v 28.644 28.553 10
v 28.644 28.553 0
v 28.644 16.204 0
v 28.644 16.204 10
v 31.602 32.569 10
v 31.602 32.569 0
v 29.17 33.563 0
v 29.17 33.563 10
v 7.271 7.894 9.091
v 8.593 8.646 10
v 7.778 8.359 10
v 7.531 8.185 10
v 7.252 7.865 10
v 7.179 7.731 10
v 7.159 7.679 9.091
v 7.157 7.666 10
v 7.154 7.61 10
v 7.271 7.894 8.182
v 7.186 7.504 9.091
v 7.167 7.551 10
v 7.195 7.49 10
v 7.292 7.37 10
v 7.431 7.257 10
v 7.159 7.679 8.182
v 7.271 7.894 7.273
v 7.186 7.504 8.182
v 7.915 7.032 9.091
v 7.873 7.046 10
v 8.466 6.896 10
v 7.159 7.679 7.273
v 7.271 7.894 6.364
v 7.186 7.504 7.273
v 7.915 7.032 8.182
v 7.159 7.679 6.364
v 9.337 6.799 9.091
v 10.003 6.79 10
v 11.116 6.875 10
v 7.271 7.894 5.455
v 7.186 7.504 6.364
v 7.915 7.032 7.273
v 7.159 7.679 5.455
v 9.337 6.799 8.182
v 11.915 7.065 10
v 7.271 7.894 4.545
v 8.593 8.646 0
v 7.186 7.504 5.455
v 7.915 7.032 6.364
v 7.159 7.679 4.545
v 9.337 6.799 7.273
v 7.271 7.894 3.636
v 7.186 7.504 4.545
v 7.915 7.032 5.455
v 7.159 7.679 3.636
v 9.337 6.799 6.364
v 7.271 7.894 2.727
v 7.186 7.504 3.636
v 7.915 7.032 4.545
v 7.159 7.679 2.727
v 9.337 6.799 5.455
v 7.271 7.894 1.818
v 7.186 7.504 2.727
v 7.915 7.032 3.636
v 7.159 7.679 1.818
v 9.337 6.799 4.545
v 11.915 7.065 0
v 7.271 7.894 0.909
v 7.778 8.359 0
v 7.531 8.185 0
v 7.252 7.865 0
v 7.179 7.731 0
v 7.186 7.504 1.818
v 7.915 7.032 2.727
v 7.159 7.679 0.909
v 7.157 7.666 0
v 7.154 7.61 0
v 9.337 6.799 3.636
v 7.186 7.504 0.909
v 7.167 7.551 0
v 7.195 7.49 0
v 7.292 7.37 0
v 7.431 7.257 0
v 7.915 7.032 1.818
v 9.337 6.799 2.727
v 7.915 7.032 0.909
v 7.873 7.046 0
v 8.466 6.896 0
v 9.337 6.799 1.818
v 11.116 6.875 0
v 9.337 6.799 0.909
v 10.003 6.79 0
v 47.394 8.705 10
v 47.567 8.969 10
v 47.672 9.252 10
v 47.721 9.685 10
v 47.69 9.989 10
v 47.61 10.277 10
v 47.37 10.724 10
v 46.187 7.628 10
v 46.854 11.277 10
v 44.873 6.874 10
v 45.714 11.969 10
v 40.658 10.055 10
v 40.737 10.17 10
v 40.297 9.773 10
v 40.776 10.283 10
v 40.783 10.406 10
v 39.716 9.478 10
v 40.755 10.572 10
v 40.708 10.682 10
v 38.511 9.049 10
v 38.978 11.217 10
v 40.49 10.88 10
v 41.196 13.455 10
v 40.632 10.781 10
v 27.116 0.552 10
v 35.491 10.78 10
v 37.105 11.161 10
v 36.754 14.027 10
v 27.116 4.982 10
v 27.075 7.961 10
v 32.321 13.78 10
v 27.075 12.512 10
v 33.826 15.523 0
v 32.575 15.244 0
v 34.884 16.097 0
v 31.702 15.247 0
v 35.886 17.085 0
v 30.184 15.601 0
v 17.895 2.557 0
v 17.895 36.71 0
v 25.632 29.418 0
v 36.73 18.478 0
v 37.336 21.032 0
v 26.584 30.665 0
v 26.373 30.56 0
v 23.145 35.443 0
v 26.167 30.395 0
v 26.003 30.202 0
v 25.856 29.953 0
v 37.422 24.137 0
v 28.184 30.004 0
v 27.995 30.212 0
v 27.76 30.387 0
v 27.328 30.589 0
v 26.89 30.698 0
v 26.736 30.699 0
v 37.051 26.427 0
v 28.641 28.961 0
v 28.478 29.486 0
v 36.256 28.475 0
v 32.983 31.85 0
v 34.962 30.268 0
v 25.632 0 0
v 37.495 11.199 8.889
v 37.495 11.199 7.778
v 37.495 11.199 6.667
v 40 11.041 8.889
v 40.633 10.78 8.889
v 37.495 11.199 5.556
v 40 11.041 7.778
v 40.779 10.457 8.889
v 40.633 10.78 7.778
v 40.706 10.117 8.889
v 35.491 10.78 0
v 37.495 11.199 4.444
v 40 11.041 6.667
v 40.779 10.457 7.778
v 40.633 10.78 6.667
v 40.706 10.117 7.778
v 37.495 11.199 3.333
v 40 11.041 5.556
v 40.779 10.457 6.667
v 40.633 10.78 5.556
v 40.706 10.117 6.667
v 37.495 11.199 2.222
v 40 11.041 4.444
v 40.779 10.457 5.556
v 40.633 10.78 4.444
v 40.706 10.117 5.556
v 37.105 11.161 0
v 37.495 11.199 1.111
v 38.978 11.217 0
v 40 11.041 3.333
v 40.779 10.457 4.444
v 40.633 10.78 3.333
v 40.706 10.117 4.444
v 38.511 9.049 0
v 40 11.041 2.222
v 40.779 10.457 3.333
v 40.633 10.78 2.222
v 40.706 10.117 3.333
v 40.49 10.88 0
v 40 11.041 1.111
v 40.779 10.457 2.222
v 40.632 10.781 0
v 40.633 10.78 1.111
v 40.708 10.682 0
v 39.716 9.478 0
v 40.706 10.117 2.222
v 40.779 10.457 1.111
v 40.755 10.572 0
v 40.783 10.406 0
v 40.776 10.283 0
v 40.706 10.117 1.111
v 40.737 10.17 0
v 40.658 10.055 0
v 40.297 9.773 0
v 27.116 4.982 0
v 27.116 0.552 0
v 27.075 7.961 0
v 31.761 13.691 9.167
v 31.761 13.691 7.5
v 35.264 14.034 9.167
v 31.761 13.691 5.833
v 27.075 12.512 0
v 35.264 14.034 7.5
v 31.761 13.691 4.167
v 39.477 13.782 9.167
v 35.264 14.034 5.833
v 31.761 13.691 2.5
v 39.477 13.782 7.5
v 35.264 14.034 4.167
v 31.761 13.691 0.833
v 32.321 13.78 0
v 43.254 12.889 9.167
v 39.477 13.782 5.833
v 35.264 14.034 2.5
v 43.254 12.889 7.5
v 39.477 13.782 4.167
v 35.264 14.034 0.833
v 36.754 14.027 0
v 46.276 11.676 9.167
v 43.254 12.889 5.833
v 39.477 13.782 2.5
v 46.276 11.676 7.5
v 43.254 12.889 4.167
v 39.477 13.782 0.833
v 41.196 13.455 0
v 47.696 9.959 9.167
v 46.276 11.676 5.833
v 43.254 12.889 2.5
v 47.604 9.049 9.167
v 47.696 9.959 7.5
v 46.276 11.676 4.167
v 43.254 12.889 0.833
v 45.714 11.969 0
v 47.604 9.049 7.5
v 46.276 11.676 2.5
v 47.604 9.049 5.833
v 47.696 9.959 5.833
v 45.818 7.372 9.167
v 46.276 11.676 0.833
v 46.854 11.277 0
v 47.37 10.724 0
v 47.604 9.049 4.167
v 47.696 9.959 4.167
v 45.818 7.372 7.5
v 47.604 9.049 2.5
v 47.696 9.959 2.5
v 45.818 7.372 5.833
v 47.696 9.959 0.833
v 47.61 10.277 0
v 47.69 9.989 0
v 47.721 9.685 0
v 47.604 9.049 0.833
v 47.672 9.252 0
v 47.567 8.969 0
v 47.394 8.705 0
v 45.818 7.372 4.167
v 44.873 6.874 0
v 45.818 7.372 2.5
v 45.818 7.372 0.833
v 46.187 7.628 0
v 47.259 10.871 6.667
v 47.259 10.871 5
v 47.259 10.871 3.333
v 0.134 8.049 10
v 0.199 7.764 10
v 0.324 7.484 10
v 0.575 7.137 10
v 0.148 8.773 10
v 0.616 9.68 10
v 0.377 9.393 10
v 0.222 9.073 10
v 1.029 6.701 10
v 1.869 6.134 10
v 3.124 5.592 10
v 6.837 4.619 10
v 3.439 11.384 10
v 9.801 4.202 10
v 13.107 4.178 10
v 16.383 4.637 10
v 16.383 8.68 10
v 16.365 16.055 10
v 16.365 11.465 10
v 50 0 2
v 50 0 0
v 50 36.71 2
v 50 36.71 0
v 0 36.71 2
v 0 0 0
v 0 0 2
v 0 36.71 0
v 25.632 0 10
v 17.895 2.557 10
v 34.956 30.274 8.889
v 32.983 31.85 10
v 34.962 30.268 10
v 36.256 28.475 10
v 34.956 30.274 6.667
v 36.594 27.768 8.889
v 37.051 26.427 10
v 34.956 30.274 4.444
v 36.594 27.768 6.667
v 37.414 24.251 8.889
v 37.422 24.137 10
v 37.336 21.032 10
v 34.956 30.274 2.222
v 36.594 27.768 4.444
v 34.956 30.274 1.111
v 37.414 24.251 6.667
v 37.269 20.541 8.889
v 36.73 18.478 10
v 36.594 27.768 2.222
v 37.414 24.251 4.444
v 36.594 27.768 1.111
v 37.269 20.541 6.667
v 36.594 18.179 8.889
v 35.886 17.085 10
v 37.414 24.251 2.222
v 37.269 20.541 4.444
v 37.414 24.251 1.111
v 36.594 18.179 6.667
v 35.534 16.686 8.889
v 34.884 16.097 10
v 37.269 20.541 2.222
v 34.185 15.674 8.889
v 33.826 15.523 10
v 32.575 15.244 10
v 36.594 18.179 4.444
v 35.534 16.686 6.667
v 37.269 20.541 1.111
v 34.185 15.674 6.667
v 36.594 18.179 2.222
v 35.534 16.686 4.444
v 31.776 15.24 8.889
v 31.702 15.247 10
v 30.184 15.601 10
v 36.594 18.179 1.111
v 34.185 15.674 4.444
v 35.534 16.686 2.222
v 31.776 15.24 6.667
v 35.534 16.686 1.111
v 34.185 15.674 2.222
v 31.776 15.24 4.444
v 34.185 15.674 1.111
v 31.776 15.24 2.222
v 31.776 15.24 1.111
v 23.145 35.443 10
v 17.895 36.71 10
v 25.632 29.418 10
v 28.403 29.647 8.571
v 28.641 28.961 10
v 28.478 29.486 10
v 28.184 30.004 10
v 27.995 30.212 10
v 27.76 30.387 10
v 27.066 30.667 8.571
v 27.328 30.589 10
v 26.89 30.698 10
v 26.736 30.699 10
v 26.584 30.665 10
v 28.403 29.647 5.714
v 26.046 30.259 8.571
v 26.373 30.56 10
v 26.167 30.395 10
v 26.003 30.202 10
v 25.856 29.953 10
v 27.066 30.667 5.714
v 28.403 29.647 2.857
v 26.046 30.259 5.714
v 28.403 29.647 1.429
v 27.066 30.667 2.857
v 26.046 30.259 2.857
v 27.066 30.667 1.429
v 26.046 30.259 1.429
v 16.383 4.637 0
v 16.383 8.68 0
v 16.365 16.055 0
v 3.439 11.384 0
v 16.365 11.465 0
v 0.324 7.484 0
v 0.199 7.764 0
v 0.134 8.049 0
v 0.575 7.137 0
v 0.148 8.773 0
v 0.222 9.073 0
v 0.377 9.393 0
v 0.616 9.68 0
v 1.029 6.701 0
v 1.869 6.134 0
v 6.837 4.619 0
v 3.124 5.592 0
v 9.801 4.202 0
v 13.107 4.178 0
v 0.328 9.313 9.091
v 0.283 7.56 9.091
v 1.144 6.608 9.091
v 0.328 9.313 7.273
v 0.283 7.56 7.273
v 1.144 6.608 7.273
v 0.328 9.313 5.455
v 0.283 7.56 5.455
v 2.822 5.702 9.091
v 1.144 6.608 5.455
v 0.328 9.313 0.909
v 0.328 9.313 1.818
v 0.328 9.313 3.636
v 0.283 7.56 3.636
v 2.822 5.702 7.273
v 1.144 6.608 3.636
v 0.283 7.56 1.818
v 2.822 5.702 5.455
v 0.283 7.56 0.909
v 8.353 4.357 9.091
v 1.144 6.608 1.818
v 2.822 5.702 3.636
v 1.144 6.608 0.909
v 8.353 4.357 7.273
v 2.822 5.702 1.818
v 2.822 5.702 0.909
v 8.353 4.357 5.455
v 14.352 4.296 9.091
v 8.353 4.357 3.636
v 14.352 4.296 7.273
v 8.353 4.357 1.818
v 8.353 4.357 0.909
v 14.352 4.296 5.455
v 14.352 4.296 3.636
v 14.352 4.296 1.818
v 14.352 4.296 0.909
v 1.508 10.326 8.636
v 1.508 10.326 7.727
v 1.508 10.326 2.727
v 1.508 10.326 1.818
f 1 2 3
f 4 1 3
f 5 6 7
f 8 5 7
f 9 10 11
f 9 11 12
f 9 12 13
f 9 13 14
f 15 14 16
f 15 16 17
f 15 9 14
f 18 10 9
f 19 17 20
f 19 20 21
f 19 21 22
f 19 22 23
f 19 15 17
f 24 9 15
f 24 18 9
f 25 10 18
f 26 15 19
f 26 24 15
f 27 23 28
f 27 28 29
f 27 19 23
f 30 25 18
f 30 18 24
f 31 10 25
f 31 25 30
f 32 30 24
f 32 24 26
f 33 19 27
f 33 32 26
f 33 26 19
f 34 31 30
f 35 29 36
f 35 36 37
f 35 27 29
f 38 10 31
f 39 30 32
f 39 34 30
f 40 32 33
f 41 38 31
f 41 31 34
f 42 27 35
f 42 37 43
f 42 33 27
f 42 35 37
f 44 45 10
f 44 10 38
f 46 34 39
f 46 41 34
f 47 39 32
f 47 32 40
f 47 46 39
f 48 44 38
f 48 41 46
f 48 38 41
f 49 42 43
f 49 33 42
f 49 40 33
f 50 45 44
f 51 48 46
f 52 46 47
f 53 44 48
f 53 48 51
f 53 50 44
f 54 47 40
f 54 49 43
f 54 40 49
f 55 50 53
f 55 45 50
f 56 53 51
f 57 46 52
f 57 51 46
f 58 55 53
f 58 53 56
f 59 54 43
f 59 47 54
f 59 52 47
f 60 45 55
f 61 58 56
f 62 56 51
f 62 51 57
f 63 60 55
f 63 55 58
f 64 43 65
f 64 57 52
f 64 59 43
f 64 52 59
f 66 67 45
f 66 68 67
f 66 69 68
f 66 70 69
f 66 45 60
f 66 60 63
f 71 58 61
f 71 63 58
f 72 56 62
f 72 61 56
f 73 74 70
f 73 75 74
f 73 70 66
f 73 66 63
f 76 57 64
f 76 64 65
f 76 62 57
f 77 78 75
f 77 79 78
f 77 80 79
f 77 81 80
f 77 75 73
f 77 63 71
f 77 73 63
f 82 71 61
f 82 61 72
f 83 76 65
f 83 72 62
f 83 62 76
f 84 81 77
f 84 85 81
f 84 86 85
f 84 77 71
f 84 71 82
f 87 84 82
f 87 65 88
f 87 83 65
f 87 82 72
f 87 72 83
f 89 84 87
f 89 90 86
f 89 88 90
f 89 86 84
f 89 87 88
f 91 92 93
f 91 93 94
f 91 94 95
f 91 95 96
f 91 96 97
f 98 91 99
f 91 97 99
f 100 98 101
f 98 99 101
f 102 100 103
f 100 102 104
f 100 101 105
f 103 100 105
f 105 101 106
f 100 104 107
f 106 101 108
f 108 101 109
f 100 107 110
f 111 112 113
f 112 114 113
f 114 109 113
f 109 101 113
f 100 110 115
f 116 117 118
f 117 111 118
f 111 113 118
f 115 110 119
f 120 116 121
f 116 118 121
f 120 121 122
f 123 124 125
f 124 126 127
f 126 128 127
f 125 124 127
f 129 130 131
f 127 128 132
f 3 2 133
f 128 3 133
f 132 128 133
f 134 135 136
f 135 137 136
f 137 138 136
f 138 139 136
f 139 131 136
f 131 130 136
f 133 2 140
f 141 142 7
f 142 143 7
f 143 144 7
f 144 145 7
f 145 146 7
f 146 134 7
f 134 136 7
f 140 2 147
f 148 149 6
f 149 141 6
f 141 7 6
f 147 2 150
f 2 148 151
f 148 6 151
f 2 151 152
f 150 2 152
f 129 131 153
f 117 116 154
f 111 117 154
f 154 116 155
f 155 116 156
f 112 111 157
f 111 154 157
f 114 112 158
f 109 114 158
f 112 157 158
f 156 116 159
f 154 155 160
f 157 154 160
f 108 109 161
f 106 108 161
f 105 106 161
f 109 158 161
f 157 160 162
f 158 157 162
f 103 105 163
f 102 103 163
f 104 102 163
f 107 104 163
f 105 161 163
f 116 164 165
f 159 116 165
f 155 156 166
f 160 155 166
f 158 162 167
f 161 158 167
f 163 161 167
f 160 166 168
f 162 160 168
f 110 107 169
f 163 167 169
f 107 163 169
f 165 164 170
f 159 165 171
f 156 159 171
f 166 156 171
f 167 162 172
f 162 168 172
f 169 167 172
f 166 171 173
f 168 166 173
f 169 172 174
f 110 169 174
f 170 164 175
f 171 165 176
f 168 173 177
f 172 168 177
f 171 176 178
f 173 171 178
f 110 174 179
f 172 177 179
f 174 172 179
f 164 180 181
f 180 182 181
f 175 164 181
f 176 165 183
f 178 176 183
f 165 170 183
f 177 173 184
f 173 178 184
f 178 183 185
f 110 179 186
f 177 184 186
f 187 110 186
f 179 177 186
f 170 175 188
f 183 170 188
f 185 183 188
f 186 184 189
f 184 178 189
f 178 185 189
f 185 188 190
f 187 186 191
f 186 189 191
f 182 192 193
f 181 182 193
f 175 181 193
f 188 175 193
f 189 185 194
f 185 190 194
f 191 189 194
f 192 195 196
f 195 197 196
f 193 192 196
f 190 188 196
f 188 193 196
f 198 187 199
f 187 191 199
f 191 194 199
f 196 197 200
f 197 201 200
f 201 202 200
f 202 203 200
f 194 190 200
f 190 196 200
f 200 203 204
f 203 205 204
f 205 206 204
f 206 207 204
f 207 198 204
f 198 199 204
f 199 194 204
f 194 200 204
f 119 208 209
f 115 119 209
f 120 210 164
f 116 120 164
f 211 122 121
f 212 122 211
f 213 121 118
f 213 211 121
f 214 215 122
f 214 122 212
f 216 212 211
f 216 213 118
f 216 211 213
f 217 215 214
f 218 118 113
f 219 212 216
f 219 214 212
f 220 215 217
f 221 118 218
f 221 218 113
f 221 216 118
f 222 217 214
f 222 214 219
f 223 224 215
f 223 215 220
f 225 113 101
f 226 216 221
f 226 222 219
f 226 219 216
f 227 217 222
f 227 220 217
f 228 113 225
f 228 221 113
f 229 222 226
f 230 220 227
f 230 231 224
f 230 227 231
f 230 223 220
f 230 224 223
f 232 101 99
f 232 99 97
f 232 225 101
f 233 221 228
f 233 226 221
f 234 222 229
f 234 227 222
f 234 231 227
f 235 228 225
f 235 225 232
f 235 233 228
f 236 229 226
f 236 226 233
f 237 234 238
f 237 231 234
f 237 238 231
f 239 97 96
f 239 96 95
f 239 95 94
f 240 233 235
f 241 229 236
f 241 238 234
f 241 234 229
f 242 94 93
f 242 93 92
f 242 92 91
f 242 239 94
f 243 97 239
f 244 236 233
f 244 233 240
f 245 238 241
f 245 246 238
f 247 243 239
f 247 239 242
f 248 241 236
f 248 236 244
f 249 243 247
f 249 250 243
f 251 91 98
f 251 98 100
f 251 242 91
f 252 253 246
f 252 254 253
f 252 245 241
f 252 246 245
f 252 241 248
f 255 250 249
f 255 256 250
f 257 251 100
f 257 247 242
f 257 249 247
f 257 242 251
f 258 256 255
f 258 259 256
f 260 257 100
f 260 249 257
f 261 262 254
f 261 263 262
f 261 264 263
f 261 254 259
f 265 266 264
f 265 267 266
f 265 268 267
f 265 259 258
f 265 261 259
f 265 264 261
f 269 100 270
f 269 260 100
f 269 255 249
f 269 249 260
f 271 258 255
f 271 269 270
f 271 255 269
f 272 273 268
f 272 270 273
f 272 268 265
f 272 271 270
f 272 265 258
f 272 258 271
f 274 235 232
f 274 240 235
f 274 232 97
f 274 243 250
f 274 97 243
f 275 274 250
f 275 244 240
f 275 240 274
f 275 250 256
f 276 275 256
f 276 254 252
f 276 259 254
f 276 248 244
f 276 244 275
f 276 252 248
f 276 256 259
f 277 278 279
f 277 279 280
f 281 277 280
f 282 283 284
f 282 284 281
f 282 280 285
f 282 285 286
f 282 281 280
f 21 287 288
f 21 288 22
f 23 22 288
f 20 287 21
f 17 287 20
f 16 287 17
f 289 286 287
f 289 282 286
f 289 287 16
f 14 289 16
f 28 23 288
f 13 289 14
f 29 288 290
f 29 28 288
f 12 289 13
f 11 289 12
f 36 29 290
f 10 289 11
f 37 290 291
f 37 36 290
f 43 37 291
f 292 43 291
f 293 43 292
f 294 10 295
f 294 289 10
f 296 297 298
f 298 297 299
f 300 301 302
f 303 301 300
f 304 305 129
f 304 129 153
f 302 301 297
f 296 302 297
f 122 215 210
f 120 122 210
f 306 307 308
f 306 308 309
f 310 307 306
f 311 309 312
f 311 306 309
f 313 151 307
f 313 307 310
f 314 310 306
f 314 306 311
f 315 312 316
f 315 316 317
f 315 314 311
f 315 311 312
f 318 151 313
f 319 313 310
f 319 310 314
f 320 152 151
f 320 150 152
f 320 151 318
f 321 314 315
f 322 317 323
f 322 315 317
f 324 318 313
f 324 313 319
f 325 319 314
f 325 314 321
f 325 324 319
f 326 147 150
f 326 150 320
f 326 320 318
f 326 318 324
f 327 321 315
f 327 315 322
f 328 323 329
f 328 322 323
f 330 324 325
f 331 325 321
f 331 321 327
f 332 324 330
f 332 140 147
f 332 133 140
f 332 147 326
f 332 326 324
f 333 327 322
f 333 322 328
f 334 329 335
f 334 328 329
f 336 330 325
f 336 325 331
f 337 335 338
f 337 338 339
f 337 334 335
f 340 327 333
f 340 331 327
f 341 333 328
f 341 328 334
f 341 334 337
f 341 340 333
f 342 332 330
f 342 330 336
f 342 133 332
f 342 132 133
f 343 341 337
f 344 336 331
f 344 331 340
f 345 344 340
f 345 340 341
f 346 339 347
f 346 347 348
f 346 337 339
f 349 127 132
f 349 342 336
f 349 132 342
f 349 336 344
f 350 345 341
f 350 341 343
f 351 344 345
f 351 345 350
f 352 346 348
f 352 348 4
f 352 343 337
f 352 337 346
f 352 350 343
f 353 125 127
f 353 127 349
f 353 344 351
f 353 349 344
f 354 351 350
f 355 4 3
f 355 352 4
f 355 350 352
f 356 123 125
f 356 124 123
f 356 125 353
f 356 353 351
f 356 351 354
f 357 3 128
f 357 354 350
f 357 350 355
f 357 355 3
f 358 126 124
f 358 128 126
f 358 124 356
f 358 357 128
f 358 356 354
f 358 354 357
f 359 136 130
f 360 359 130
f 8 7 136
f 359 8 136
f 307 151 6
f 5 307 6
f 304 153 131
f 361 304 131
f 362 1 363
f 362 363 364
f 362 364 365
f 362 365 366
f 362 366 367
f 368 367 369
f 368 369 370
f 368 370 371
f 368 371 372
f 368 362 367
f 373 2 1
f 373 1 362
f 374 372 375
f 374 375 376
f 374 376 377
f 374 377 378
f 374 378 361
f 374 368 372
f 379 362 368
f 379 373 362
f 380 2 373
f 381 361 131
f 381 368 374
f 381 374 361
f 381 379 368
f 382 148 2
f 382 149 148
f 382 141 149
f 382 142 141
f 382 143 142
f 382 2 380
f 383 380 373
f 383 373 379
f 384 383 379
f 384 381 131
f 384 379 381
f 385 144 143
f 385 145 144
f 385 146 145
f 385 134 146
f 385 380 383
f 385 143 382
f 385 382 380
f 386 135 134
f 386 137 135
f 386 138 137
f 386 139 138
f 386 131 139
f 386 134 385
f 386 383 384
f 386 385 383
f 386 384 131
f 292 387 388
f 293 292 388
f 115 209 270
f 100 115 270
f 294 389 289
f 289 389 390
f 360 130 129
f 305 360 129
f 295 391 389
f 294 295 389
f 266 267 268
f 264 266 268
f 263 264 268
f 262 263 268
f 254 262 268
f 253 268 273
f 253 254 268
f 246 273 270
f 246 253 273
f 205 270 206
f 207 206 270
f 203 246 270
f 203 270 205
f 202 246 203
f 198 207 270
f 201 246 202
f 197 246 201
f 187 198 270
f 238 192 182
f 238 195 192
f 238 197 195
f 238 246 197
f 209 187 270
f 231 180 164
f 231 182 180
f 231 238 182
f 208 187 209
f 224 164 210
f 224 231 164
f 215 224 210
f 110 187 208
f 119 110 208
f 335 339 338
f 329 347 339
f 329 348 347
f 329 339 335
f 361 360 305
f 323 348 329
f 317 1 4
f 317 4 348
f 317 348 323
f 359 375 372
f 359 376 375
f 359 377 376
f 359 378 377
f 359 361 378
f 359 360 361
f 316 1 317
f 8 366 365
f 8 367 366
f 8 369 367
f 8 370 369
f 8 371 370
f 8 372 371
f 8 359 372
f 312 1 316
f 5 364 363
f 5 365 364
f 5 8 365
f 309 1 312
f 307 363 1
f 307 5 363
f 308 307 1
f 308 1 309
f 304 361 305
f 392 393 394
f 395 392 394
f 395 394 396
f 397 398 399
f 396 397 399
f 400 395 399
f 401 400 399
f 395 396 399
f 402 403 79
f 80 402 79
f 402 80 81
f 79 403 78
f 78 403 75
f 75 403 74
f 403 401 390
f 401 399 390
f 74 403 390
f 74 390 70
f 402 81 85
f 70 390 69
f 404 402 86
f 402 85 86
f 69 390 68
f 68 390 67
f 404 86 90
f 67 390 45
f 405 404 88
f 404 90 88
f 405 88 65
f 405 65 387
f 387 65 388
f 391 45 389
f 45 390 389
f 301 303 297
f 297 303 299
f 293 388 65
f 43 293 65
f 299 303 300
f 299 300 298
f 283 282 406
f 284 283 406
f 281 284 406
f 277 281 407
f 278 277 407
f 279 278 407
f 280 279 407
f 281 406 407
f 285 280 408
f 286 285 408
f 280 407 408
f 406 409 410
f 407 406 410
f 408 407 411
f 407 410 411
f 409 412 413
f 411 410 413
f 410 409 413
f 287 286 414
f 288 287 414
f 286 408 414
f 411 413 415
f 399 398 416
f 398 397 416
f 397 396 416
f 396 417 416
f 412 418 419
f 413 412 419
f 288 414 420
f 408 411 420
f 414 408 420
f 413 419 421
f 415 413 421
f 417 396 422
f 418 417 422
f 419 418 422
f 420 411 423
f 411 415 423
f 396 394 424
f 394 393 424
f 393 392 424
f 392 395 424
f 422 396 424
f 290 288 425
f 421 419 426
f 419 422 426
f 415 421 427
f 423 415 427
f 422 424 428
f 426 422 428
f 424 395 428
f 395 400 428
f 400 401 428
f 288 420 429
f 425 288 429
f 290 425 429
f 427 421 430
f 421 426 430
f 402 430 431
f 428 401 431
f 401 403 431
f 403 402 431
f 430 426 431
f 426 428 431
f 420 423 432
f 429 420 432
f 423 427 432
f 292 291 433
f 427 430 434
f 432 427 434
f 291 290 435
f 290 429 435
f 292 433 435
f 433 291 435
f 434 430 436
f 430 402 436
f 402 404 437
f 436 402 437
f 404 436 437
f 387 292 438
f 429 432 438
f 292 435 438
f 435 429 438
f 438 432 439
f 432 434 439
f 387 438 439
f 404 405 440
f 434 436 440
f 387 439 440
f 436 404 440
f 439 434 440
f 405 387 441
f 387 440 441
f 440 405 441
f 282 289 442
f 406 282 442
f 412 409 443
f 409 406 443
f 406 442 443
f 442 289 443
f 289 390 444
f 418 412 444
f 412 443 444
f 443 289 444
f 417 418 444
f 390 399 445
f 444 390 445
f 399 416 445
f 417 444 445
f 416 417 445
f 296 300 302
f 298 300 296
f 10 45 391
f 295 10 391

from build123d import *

# Parameters (mm, degrees)
F1_DEPTH = 10
F2_W     = 50
F2_H     = 36.7095391211
F3_DEPTH = 2


with BuildPart() as f1:
    # F0 (on Top) → F1 (new body)
    with BuildSketch(Plane.XY):
        with BuildLine():
            Line((23.145198822, 35.4425683618), (17.8945399821, 36.7095391211))
            Line((17.8945399821, 36.7095391211), (17.8945399821, 2.5568525307))
            Line((17.8945399821, 2.5568525307), (25.6323553622, 0))
            Line((25.6323553622, 0), (25.6323553622, 29.4181257486))
            add(Edge.make_bspline(
                [(28.6437571049, 28.5532325506), (28.6545749541, 28.6743432494), (28.6802923701, 28.9622613155), (28.4254929956, 29.684596938), (27.9535761776, 30.3658785351), (27.0770871185, 30.6983034331), (26.5763598339, 30.729052907), (25.9619146503, 30.2846915439), (25.7479217692, 29.7220039856), (25.6323553622, 29.4181257486)],
                knots=[0, 0, 0, 0, 0.1073061872, 0.2551004181, 0.4121775408, 0.5742298777, 0.6925455754, 0.8339598822, 1, 1, 1, 1], degree=3))
            Line((28.6437571049, 28.5532325506), (28.6437571049, 16.2038393319))
            add(Edge.make_bspline(
                [(32.9832807183, 31.8500101566), (33.6669369624, 31.3742361451), (35.0950020592, 30.380408815), (36.8042025352, 27.797369232), (37.5853778066, 24.2838849893), (37.3824597353, 20.5887723376), (36.7441801064, 18.1728832573), (35.5780420262, 16.6373012006), (34.2378087054, 15.5196978294), (31.6633513682, 14.9444209405), (29.6979708499, 15.7641457628), (28.6437571049, 16.2038393319)],
                knots=[0, 0, 0, 0, 0.1077996083, 0.2251787494, 0.3541045173, 0.4848281988, 0.5911353252, 0.682949788, 0.7710502991, 0.8771932868, 1, 1, 1, 1], degree=3))
            Line((32.9832807183, 31.8500101566), (31.6015258431, 32.5685217977))
            Line((31.6015258431, 32.5685217977), (29.1696414351, 33.5633829236))
            Line((29.1696414351, 33.5633829236), (23.145198822, 35.4425683618))
        make_face()
    extrude(amount=F1_DEPTH)


with BuildPart() as f1b:
    # F0 (on Top) → F1, piece 2 (new body)
    with BuildSketch(Plane.XY):
        with BuildLine():
            add(Edge.make_bspline(
                [(27.075374499, 12.5115131959), (27.7607210409, 12.7177811661), (29.2007831656, 13.151195028), (31.814548219, 13.7620091087), (35.2972385999, 14.1435174048), (39.5126088992, 13.9086416183), (43.1436391346, 12.9930922239), (46.2636844791, 11.841790685), (47.3605314433, 10.8579563952), (47.7728953089, 9.9877137995), (47.694450155, 8.9793241799), (46.9950417442, 8.2646854823), (45.8451619542, 7.3247204567), (45.1788950781, 7.0159654105), (44.8730587959, 6.8742376752)],
                knots=[0, 0, 0, 0, 0.0862719737, 0.181276178, 0.2907725351, 0.4106704553, 0.5256603251, 0.6309851012, 0.6996157515, 0.7549573701, 0.8107856488, 0.868574326, 0.9396717127, 1, 1, 1, 1], degree=3))
            Line((27.075374499, 12.5115131959), (27.075374499, 7.9614268616))
            Line((27.075374499, 7.9614268616), (35.4910194874, 10.7800643891))
            add(Edge.make_bspline(
                [(35.4910194874, 10.7800643891), (35.76108316, 10.8759675501), (36.3407533038, 11.0818160399), (37.5130219341, 11.2098088816), (38.7312787994, 11.2882045343), (39.958778002, 11.0717822931), (40.6707773127, 10.8539654777), (40.8025449394, 10.4556451675), (40.7683694189, 10.0426589866), (39.8457996535, 9.4793171056), (38.9843430983, 9.2013520173), (38.5109893978, 9.0486155823)],
                knots=[0, 0, 0, 0, 0.1109951805, 0.2382423065, 0.3701536376, 0.5028255104, 0.6002877907, 0.6704297133, 0.7399682067, 0.8571175634, 1, 1, 1, 1], degree=3))
            Line((38.5109893978, 9.0486155823), (27.1156392992, 4.981723614))
            Line((27.1156392992, 4.981723614), (27.1156392992, 0.5524356966))
            Line((27.1156392992, 0.5524356966), (44.8730587959, 6.8742376752))
        make_face()
    extrude(amount=F1_DEPTH)


with BuildPart() as f1c:
    # F0 (on Top) → F1, piece 3 (new body)
    with BuildSketch(Plane.XY):
        with BuildLine():
            Line((16.3645483553, 11.4645911381), (16.3645483553, 16.0549432039))
            Line((16.3645483553, 16.0549432039), (3.4390804358, 11.3840587437))
            add(Edge.make_bspline(
                [(3.4390804358, 11.3840587437), (2.6263186112, 10.9582442241), (1.2507357067, 10.2375617857), (0.2373226624, 9.4083195602), (0.0736213145, 8.4156946782), (0.1849150341, 7.4942084911), (1.1685510699, 6.4956786208), (2.8009792371, 5.5873272621), (6.0939168275, 4.7598623775), (8.3151357087, 4.3129026395), (11.3919443413, 4.0515199625), (14.3193354073, 4.2400029354), (15.738120214, 4.5132118059), (16.3829531521, 4.6373843215)],
                knots=[0, 0, 0, 0, 0.1037195533, 0.1755432403, 0.2378180455, 0.2987502174, 0.3724630954, 0.4622952283, 0.5812602957, 0.681057203, 0.7945949151, 0.9066440775, 1, 1, 1, 1], degree=3))
            Line((16.3829531521, 4.6373843215), (16.3829531521, 8.6798174307))
            Line((16.3829531521, 8.6798174307), (11.9151469093, 7.0652834826))
            add(Edge.make_bspline(
                [(8.5931615904, 8.6459526792), (8.2579462016, 8.5551378758), (7.6696602015, 8.3957625034), (7.2680640307, 7.9093930679), (7.218831063, 7.7987948634), (7.1404644239, 7.6778778475), (7.1649777774, 7.4789751791), (7.4474141974, 7.2127491104), (7.9213575778, 7.0159568673), (8.428861503, 6.8917599097), (9.3531383476, 6.7601890735), (11.0232160459, 6.8069826444), (11.6491771424, 6.9882593359), (11.9151469093, 7.0652834826)],
                knots=[0, 0, 0, 0, 0.1224552552, 0.2149027601, 0.2566005008, 0.3007075106, 0.3524393189, 0.4273373615, 0.5154115001, 0.6028146718, 0.722218825, 0.8819712683, 1, 1, 1, 1], degree=3))
            Line((8.5931615904, 8.6459526792), (16.3645483553, 11.4645911381))
        make_face()
    extrude(amount=F1_DEPTH)


with BuildPart() as f3:
    # F2 (on Top) → F3 (new body)
    with BuildSketch(Plane.XY):
        with Locations((25, 18.3547695606)):
            Rectangle(F2_W, F2_H)
    extrude(amount=F3_DEPTH)


solid = Compound([f1.part, f1b.part, f1c.part, f3.part])
